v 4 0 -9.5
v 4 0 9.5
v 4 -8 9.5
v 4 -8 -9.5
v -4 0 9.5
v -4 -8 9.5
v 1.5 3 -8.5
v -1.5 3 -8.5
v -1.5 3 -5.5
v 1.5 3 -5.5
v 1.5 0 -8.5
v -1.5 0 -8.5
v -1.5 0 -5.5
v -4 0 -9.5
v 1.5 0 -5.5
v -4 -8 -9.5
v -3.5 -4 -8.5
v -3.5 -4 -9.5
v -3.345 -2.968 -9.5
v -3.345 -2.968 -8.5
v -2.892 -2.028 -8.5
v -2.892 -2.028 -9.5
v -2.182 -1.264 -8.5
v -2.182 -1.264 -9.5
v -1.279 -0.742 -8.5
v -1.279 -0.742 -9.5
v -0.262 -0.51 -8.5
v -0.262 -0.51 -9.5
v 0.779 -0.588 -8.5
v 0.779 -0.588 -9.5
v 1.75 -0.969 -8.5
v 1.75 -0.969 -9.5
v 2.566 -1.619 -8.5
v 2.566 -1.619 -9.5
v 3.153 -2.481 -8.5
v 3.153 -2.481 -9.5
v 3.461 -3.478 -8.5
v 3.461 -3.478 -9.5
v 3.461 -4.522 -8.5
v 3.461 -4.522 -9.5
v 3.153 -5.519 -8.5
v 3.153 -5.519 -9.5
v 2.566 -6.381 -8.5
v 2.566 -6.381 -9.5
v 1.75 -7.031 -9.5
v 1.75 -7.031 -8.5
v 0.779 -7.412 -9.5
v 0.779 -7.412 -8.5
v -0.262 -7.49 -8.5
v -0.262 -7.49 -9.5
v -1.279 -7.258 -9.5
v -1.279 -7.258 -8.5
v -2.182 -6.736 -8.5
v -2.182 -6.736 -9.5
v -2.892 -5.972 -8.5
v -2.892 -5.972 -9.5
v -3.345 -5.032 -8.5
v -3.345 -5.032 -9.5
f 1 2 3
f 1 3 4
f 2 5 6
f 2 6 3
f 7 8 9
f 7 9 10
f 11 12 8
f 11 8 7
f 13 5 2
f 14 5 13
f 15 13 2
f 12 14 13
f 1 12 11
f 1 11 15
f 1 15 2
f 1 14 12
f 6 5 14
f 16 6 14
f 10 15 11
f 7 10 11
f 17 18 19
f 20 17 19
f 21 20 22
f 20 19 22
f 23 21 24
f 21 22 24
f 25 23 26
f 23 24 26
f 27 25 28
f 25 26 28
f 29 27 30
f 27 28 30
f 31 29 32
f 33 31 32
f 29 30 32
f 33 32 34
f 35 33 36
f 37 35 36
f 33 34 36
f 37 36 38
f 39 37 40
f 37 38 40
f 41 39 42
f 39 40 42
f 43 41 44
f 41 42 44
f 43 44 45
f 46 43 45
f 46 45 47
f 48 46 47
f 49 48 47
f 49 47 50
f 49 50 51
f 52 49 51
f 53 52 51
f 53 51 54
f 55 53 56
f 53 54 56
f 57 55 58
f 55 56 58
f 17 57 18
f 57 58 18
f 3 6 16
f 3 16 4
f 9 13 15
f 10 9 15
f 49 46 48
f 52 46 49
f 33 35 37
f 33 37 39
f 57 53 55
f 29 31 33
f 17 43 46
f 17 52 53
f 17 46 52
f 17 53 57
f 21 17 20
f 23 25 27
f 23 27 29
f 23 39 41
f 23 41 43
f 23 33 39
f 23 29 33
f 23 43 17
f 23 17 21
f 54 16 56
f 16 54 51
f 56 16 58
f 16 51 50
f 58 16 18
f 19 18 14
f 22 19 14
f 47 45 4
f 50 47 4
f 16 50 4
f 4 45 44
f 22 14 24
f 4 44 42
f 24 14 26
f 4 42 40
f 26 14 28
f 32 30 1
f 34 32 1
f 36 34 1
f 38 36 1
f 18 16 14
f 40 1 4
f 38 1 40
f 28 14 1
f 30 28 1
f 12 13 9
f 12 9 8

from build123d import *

# Parameters (mm, degrees)
SKETCH2_W           = 8
SKETCH2_H           = 19
BOSS_EXTRUDE1_DEPTH = 8
SKETCH2_3_W         = 3
SKETCH2_3_H         = 3
BOSS_EXTRUDE2_DEPTH = 3
SKETCH3_R           = 3.5
CUT_EXTRUDE1_DEPTH  = 1


with BuildPart() as part:
    # Sketch2 → Boss-Extrude1 (new body)
    with BuildSketch(Plane(origin=(0, 0, 0), x_dir=(1, 0, 0), z_dir=(0, 1, 0))):
        Rectangle(SKETCH2_W, SKETCH2_H)
    extrude(amount=-BOSS_EXTRUDE1_DEPTH)

    # Sketch2<3> → Boss-Extrude2 (add)
    with BuildSketch(Plane(origin=(0, 0, 0), x_dir=(1, 0, 0), z_dir=(0, 1, 0))):
        with Locations((0, 7)):
            Rectangle(SKETCH2_3_W, SKETCH2_3_H)
    extrude(amount=BOSS_EXTRUDE2_DEPTH)

    # Sketch3 → Cut-Extrude1 (cut)
    with BuildSketch(Plane(origin=(0, 0, -9.5), x_dir=(-1, 0, 0), z_dir=(0, 0, -1))):
        with Locations((0, -4)):
            Circle(SKETCH3_R)
    extrude(amount=-CUT_EXTRUDE1_DEPTH, mode=Mode.SUBTRACT)


solid = part.part
